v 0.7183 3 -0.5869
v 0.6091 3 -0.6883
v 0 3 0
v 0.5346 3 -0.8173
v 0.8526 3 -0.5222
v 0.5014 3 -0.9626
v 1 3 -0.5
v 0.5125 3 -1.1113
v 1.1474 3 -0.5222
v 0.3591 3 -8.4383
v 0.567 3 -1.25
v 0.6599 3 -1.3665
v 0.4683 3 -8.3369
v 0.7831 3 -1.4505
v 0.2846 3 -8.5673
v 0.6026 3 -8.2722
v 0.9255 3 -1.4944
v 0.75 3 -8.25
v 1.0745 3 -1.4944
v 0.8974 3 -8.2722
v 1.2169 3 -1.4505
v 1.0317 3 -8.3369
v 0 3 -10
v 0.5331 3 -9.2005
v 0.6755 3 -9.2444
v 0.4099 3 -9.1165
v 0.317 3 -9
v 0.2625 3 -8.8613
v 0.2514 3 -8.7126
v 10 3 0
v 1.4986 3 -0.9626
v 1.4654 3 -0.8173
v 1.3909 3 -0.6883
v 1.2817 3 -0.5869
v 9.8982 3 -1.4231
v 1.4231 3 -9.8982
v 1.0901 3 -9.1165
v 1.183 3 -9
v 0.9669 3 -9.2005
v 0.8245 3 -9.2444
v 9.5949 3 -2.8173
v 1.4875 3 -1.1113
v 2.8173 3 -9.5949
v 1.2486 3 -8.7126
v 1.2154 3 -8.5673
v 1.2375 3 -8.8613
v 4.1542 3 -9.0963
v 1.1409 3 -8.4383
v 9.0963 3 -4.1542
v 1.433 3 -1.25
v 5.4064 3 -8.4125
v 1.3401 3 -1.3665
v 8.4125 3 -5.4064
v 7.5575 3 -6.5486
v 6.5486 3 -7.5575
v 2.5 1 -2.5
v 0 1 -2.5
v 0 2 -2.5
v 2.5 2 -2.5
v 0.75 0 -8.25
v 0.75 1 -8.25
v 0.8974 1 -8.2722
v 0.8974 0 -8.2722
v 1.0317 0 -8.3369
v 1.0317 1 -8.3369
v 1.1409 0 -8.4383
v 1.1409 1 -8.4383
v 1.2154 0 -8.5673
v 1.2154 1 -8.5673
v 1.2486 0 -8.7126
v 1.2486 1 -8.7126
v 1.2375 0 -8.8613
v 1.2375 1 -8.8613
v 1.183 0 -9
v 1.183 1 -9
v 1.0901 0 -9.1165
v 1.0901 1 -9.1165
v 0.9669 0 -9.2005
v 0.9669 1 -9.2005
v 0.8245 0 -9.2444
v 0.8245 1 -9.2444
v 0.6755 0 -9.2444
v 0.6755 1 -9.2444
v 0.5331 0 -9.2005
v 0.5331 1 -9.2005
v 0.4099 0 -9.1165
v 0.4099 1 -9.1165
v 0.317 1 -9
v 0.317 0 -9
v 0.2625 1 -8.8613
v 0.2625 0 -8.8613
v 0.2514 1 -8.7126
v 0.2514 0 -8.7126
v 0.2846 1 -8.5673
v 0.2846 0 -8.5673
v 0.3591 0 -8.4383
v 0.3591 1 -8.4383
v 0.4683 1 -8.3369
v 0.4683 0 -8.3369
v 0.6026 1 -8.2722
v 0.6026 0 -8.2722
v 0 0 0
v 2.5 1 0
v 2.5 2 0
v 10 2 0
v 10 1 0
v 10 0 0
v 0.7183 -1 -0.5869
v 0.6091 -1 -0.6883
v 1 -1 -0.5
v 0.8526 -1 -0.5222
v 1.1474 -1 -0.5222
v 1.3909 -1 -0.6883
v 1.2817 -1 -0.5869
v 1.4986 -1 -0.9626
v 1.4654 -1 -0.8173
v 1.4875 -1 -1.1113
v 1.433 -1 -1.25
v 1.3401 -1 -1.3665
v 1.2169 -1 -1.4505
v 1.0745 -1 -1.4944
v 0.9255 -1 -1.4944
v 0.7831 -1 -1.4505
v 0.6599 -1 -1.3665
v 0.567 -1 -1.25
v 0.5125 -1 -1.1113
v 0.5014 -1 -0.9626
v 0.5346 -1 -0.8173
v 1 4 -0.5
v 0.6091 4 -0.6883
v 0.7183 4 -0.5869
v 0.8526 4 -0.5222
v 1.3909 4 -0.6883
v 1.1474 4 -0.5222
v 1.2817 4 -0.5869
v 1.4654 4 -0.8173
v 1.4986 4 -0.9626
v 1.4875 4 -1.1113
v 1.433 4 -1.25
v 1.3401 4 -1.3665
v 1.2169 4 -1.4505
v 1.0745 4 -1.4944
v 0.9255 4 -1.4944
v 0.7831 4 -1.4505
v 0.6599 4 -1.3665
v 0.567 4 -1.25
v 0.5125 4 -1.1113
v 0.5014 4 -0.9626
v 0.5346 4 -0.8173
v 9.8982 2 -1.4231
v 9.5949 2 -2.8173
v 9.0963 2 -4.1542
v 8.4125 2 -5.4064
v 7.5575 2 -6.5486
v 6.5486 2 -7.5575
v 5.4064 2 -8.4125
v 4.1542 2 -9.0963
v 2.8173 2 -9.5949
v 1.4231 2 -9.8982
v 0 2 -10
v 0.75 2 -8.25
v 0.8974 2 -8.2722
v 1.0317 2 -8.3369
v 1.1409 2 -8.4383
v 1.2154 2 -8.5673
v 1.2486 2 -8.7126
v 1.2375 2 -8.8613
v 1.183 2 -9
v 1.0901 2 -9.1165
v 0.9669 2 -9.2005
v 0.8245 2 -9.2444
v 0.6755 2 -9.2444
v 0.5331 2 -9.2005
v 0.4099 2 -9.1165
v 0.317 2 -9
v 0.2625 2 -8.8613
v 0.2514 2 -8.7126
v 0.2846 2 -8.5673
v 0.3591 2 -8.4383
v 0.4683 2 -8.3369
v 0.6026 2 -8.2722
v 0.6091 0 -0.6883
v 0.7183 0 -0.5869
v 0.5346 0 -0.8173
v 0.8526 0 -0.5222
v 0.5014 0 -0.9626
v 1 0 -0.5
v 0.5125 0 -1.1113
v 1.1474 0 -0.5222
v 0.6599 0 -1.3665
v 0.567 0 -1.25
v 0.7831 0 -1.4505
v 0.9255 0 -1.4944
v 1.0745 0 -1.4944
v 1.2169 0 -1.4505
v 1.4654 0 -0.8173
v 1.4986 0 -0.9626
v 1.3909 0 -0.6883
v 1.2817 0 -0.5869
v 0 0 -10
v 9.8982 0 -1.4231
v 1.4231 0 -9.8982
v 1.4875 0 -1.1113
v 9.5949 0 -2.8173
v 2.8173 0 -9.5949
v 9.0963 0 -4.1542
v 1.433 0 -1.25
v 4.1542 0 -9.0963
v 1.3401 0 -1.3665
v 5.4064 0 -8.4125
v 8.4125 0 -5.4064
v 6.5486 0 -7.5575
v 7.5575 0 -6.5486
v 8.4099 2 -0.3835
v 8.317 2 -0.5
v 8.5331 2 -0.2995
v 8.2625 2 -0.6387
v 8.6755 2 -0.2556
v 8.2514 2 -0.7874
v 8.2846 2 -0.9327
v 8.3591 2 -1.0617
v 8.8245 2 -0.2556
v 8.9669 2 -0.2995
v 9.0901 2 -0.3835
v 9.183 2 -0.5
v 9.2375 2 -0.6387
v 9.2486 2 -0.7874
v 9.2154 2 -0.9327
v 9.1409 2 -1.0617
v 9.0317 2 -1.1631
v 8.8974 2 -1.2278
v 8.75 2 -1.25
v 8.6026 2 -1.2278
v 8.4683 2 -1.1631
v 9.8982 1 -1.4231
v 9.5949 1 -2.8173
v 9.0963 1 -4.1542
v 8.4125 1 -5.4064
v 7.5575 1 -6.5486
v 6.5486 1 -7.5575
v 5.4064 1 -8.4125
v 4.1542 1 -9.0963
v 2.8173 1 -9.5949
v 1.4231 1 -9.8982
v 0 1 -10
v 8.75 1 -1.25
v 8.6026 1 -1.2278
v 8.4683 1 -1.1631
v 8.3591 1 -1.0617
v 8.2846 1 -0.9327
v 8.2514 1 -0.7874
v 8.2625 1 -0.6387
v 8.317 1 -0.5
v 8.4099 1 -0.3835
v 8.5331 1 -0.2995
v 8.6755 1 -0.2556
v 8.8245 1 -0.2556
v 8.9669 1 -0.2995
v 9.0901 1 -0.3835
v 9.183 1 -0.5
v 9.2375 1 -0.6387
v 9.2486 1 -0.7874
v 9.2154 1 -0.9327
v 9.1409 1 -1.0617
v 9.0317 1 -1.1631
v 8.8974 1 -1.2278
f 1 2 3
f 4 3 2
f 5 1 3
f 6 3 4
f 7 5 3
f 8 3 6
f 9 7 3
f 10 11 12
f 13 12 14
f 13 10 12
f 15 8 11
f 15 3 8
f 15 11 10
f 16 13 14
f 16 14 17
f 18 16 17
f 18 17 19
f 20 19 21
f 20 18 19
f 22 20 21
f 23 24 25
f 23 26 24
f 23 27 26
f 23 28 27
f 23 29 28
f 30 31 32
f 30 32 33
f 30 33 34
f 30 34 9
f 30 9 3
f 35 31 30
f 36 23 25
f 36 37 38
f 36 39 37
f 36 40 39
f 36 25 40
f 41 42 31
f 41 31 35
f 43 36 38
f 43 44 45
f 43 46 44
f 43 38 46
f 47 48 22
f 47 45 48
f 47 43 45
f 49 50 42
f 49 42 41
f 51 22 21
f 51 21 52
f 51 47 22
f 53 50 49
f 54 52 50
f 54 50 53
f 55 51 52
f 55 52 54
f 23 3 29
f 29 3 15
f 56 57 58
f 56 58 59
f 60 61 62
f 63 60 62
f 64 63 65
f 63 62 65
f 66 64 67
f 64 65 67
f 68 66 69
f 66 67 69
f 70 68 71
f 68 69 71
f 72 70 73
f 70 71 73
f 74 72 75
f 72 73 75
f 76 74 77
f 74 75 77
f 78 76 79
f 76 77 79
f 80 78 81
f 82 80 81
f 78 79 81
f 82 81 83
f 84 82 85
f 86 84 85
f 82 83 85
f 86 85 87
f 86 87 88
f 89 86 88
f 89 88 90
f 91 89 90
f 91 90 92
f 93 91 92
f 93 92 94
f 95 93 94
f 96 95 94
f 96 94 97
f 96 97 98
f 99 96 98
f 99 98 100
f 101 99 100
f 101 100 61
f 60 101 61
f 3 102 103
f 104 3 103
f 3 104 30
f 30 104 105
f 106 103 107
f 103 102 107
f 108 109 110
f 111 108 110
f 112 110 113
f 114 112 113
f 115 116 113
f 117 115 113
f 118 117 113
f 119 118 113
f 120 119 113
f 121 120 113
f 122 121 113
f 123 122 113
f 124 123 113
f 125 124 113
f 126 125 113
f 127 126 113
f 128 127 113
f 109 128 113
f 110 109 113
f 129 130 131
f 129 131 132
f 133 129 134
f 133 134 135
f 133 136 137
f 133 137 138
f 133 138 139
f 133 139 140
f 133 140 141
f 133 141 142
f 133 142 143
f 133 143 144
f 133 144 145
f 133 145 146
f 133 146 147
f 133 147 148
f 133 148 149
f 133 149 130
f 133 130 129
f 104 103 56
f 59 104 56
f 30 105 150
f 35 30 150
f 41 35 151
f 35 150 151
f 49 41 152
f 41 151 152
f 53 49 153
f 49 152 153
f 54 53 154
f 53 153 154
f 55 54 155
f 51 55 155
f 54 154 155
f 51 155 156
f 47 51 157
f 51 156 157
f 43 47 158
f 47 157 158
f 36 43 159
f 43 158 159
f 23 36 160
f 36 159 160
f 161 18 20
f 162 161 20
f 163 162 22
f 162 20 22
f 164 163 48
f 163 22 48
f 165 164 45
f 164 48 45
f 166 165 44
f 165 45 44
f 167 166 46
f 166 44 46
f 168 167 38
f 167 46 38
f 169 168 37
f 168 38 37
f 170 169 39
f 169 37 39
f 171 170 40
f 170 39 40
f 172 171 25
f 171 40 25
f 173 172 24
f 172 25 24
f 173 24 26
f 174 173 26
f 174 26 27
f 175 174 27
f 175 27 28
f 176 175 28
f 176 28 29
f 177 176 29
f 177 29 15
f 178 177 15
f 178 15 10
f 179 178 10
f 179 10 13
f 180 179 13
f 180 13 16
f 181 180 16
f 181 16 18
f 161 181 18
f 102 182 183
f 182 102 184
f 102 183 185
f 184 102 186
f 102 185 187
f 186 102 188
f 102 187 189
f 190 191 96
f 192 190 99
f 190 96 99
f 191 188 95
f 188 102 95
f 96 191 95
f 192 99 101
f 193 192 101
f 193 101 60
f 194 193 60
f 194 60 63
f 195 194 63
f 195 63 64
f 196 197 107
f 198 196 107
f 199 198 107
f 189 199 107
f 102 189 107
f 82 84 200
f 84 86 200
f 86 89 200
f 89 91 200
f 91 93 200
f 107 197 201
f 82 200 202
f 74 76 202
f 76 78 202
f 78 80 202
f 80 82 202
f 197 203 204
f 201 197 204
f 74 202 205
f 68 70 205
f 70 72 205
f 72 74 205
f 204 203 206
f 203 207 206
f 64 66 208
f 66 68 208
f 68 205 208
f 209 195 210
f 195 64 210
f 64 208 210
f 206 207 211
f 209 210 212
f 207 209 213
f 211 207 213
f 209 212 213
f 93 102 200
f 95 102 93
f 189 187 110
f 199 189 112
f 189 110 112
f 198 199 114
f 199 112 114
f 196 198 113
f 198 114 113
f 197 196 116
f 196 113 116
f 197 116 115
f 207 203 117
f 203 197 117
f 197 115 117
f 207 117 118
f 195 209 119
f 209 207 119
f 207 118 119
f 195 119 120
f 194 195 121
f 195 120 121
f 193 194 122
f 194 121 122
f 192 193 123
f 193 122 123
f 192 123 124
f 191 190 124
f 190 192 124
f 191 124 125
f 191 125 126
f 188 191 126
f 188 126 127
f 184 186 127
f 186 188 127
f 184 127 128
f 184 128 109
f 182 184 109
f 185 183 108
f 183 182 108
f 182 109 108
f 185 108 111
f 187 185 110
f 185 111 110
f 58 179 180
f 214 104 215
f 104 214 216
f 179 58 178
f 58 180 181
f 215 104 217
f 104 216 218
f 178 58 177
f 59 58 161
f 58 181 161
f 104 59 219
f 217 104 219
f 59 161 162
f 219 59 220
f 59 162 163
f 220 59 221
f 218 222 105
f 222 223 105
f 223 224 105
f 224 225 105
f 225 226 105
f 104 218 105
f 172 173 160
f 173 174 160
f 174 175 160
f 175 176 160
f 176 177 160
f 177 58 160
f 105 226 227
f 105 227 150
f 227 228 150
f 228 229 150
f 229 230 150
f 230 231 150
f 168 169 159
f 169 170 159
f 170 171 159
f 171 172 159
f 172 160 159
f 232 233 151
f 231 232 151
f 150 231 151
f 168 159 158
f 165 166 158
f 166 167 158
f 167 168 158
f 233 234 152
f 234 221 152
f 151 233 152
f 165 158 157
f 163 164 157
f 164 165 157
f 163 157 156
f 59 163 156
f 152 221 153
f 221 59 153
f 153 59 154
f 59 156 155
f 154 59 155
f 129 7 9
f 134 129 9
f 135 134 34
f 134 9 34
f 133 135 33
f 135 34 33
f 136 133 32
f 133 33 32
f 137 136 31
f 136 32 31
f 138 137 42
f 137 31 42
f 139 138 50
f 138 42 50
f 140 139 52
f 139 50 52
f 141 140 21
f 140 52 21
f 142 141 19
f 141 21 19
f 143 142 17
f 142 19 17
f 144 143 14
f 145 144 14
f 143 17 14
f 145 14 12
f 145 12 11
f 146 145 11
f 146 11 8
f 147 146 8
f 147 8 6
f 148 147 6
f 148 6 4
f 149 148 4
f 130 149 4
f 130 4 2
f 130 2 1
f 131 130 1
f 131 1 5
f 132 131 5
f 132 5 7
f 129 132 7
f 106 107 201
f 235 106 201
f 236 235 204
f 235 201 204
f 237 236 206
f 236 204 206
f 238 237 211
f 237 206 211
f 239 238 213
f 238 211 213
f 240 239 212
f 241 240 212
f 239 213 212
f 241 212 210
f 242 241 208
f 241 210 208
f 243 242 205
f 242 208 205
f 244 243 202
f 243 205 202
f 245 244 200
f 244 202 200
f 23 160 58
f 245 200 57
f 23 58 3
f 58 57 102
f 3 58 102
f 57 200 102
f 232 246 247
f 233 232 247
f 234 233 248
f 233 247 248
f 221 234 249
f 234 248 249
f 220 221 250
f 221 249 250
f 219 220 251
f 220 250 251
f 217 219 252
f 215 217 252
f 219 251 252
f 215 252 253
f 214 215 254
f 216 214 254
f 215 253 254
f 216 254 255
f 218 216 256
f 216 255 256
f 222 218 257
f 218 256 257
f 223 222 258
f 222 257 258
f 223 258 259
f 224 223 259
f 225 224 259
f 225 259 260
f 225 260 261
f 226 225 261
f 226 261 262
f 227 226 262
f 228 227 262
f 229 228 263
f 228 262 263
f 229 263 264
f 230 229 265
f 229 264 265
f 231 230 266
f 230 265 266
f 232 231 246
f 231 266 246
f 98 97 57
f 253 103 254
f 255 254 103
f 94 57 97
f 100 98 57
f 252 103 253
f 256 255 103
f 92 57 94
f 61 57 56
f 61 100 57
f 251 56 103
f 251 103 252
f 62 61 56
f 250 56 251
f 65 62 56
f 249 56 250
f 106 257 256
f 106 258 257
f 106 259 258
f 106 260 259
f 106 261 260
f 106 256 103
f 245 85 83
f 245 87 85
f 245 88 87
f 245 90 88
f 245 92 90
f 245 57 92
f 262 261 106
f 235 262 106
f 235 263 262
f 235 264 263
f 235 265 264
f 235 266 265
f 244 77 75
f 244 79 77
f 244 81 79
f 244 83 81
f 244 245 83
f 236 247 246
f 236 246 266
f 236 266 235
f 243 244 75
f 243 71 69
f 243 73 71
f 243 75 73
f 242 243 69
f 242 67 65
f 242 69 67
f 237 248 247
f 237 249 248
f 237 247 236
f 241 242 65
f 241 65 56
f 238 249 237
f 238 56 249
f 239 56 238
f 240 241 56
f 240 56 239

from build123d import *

# Parameters (mm, degrees)
BOSS_EXTRUDE1_DEPTH      = 1
SKETCH2_R                = 0.5
SKETCH2_W                = 2.5
SKETCH2_H                = 2.5
BOSS_EXTRUDE2_DEPTH      = 1
BOSS_EXTRUDE3_DEPTH      = 1
SKETCH4_R                = 0.5
CUT_EXTRUDE1_DEPTH       = 15.456832295
BOSS_EXTRUDE4_DEPTH      = 1
BOSS_EXTRUDE4_DEPTH_BACK = 4
SKETCH5_R                = 0.5


with BuildPart() as part:
    # Sketch1 → Boss-Extrude1 (new body)
    with BuildSketch(Plane(origin=(0, 0, 0), x_dir=(1, 0, 0), z_dir=(0, 1, 0))):
        with BuildLine():
            Line((0, 0), (10, 0))
            ThreePointArc((10, 0), (7.071067812, 7.071067812), (0, 10))
            Line((0, 10), (0, 0))
        make_face()
    extrude(amount=BOSS_EXTRUDE1_DEPTH)

    # Sketch2 → Boss-Extrude2 (add)
    with BuildSketch(Plane(origin=(0, 1, 0), x_dir=(1, 0, 0), z_dir=(0, 1, 0))):
        with Locations(Location((8.75, 0.75, 0), (0, 0, 90))):
            Circle(SKETCH2_R)
        with Locations((1.25, 1.25)):
            Rectangle(SKETCH2_W, SKETCH2_H)
    extrude(amount=BOSS_EXTRUDE2_DEPTH)

    # Sketch3 → Boss-Extrude3 (add)
    with BuildSketch(Plane(origin=(0, 2, 0), x_dir=(1, 0, 0), z_dir=(0, 1, 0))):
        with BuildLine():
            Line((0, 10), (0, 0))
            Line((0, 0), (10, 0))
            ThreePointArc((10, 0), (7.071067812, 7.071067812), (0, 10))
        make_face()
    extrude(amount=BOSS_EXTRUDE3_DEPTH)

    # Sketch4 → Cut-Extrude1 (cut, through all)
    with BuildSketch(Plane(origin=(0, 3, 0), x_dir=(1, 0, 0), z_dir=(0, 1, 0))):
        with Locations(Location((0.75, 8.75, 0), (0, 0, 270))):
            Circle(SKETCH4_R)
    extrude(amount=-CUT_EXTRUDE1_DEPTH, mode=Mode.SUBTRACT)

    # Sketch5 → Boss-Extrude4 (add, two sides: drawn at the far end of the back side and taken through both)
    with BuildSketch(Plane(origin=(0, 3, 0), x_dir=(1, 0, 0), z_dir=(0, 1, 0)).offset(-BOSS_EXTRUDE4_DEPTH_BACK)):
        with Locations(Location((1, 1, 0), (0, 0, 270))):
            Circle(SKETCH5_R)
    extrude(amount=BOSS_EXTRUDE4_DEPTH + BOSS_EXTRUDE4_DEPTH_BACK)


solid = part.part
